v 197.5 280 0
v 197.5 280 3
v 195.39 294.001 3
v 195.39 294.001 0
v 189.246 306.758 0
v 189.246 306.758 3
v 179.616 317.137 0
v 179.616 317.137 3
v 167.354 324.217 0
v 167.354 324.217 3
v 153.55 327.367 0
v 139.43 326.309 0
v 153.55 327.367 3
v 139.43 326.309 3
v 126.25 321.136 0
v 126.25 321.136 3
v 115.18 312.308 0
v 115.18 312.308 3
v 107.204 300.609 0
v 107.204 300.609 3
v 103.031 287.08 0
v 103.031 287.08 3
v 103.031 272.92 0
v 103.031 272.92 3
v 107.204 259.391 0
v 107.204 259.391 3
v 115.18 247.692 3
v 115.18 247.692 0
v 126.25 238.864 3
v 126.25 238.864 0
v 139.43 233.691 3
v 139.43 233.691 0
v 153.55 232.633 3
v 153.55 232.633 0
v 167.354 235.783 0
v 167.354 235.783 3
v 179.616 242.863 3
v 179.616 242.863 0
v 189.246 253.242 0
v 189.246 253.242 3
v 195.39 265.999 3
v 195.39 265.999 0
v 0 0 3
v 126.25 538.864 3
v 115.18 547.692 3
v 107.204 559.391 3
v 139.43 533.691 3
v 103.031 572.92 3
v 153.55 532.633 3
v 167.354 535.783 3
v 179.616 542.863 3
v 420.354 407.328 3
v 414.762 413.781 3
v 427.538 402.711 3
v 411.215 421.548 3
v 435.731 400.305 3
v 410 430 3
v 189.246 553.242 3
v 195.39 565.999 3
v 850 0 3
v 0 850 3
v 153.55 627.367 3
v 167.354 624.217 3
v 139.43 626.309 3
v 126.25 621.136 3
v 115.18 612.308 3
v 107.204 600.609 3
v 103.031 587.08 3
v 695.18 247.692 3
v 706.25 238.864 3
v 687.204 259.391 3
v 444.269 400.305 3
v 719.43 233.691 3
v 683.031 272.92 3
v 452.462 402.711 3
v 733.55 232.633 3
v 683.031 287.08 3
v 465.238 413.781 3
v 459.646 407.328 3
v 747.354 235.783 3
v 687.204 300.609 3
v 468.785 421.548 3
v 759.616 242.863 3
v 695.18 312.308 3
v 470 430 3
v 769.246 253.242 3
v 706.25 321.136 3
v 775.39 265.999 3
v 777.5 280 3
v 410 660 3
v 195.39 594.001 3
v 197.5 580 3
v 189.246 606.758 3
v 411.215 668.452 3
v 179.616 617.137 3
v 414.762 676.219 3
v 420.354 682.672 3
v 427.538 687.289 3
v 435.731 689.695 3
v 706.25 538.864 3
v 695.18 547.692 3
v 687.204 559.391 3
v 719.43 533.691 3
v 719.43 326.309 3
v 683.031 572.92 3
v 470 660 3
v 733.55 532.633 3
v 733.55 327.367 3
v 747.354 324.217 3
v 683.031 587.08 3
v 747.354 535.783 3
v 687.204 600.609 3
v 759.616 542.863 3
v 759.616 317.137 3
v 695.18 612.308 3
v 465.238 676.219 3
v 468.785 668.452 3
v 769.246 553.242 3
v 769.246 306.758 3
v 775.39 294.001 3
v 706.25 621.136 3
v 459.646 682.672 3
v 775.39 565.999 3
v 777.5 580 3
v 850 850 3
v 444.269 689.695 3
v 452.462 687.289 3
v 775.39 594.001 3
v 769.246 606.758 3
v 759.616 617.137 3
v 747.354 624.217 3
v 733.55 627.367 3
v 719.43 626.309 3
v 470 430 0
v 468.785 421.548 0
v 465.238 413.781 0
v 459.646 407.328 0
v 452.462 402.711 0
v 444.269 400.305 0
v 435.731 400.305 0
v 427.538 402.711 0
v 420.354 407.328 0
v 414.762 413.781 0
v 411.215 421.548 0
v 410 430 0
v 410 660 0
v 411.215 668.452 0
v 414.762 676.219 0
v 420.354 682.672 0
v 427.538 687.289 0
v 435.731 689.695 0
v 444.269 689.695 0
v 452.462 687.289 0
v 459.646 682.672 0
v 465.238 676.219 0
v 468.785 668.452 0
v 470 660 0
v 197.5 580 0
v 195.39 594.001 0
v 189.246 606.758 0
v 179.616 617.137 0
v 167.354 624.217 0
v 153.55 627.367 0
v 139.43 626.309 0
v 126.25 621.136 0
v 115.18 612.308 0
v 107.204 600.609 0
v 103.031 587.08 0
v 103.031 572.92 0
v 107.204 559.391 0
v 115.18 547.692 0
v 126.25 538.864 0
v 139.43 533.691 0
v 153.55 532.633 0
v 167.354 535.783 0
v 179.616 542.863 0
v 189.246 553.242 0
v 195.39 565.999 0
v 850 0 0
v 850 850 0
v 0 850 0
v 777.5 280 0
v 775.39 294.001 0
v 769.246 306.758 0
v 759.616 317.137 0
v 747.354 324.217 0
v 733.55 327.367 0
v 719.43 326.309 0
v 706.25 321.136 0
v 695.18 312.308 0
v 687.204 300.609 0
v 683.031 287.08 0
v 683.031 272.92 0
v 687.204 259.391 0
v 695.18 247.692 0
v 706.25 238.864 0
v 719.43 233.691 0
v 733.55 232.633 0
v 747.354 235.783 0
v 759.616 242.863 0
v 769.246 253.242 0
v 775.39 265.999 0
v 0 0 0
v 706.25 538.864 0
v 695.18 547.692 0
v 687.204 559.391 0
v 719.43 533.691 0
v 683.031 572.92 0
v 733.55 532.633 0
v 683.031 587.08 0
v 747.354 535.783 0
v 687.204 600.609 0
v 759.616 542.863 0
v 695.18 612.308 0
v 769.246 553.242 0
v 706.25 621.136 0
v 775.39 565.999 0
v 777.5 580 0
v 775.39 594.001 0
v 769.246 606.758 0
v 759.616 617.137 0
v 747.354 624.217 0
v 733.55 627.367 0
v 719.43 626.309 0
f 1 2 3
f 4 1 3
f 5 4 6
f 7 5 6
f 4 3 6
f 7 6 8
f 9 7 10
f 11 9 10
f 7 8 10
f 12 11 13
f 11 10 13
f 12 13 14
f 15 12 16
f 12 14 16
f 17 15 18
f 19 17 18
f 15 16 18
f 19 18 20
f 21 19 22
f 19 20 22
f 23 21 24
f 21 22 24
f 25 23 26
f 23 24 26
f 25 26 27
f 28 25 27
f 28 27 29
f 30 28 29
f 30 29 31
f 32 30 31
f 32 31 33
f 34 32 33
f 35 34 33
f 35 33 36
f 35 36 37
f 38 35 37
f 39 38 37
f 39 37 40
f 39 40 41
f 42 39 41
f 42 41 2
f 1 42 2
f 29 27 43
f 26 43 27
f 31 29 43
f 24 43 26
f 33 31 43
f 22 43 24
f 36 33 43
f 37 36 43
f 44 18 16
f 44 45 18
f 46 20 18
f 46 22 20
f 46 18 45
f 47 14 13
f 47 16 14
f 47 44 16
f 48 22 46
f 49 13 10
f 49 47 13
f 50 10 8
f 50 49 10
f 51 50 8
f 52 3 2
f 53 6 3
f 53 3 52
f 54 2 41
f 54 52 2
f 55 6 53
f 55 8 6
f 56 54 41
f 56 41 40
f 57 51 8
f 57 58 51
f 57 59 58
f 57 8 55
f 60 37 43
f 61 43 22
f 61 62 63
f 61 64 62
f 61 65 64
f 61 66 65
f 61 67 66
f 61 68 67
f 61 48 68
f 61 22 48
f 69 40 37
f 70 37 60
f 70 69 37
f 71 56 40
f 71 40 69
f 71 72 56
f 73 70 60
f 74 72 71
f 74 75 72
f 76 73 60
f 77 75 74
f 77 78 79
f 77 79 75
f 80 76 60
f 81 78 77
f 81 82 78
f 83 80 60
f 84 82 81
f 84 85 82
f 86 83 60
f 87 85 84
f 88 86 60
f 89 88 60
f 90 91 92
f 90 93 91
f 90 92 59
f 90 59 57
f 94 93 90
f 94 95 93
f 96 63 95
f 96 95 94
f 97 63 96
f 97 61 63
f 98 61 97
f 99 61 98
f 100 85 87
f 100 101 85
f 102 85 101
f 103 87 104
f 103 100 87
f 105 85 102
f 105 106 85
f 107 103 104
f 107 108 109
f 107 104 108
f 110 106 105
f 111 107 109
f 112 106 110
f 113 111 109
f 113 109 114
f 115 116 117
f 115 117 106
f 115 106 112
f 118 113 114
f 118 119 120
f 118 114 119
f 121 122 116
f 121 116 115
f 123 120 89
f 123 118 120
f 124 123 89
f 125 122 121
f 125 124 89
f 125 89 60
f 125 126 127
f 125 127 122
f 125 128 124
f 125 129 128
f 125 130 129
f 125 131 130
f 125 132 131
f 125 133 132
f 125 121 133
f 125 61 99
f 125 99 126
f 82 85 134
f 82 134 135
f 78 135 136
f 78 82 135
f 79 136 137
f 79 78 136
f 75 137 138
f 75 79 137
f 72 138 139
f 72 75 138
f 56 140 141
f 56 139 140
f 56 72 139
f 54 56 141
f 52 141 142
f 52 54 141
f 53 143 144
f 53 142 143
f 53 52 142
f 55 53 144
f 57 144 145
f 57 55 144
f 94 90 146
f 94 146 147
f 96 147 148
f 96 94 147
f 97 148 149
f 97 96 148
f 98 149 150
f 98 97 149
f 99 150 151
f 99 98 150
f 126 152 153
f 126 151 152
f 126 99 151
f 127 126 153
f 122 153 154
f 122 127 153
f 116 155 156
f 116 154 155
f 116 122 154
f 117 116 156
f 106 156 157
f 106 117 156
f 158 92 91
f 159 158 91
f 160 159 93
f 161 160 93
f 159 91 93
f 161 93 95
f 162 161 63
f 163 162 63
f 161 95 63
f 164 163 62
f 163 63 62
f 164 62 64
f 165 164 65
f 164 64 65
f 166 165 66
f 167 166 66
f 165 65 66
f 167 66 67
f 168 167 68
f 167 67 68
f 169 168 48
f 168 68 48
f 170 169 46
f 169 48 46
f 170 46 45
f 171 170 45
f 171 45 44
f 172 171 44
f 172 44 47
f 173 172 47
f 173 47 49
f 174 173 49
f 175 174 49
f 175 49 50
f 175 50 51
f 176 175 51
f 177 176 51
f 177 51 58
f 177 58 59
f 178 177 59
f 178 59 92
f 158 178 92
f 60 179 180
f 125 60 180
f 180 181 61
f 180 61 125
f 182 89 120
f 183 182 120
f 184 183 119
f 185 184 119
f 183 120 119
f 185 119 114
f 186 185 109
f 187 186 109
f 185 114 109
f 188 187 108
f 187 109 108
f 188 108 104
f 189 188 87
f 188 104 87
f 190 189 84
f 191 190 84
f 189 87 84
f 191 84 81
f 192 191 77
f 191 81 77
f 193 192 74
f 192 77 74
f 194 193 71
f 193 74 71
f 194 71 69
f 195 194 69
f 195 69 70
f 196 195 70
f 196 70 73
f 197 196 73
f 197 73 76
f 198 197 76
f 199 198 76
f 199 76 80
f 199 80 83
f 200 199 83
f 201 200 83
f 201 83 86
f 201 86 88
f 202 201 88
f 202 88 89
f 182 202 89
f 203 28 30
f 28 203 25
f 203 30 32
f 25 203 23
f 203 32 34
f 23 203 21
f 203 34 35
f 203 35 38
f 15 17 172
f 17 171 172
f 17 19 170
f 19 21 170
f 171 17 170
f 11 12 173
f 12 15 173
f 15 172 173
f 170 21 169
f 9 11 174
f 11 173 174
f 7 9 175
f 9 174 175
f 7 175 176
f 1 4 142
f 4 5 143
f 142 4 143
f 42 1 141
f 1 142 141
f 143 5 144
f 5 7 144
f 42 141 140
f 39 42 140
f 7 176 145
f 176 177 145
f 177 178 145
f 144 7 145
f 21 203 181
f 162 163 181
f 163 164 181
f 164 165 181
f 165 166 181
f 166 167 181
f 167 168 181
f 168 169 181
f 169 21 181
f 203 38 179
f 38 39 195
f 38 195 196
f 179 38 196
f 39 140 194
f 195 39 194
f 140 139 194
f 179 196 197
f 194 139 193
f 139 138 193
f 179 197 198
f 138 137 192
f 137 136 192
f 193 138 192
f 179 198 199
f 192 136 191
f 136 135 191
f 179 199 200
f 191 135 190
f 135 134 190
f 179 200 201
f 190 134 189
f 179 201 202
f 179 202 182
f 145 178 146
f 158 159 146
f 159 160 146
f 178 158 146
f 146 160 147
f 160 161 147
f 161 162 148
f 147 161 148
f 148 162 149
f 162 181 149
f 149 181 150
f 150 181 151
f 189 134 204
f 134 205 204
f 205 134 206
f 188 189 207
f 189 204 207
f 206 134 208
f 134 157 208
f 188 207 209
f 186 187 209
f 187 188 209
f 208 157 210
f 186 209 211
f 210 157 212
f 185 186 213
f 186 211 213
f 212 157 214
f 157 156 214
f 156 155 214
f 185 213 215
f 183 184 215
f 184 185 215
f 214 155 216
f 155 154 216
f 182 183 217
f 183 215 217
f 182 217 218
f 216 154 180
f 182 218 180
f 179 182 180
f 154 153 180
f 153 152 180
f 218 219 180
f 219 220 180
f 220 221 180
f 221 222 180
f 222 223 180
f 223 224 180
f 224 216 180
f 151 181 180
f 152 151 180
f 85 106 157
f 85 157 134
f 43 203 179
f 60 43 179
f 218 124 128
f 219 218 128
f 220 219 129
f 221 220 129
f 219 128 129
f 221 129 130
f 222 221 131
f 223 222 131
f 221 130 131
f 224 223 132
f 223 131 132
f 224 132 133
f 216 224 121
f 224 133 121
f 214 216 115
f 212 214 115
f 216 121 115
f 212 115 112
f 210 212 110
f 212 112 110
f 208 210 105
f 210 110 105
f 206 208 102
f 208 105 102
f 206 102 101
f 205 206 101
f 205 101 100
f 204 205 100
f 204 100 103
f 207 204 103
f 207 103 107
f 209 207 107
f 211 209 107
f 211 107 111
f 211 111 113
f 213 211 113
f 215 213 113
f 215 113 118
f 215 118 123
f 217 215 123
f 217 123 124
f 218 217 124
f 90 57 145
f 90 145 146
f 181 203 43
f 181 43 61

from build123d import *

# Parameters (mm, degrees)
SKETCH_1_W          = 850
SKETCH_1_H          = 850
EXTRUDE_1_DEPTH     = 3
SKETCH_2_R          = 47.5
CUT_EXTRUDE_1_DEPTH = 1203.085271518


with BuildPart() as part:
    # 草图1 → 凸台-拉伸1 (new body)
    with BuildSketch(Plane.XY):
        with Locations((425, 425)):
            Rectangle(SKETCH_1_W, SKETCH_1_H)
    extrude(amount=EXTRUDE_1_DEPTH)

    # 草图2 → 切除-拉伸1 (cut, through all)
    with BuildSketch(Plane.XY.offset(3)):
        with Locations((150, 580)):
            Circle(SKETCH_2_R)
        with Locations((150, 280)):
            Circle(SKETCH_2_R)
        with Locations((730, 280)):
            Circle(SKETCH_2_R)
        with Locations((730, 580)):
            Circle(SKETCH_2_R)
        with BuildLine():
            Line((470, 660), (470, 430))
            ThreePointArc((470, 430), (440, 400), (410, 430))
            Line((410, 430), (410, 660))
            ThreePointArc((410, 660), (440, 690), (470, 660))
        make_face()
    extrude(amount=-CUT_EXTRUDE_1_DEPTH, mode=Mode.SUBTRACT)


solid = part.part
